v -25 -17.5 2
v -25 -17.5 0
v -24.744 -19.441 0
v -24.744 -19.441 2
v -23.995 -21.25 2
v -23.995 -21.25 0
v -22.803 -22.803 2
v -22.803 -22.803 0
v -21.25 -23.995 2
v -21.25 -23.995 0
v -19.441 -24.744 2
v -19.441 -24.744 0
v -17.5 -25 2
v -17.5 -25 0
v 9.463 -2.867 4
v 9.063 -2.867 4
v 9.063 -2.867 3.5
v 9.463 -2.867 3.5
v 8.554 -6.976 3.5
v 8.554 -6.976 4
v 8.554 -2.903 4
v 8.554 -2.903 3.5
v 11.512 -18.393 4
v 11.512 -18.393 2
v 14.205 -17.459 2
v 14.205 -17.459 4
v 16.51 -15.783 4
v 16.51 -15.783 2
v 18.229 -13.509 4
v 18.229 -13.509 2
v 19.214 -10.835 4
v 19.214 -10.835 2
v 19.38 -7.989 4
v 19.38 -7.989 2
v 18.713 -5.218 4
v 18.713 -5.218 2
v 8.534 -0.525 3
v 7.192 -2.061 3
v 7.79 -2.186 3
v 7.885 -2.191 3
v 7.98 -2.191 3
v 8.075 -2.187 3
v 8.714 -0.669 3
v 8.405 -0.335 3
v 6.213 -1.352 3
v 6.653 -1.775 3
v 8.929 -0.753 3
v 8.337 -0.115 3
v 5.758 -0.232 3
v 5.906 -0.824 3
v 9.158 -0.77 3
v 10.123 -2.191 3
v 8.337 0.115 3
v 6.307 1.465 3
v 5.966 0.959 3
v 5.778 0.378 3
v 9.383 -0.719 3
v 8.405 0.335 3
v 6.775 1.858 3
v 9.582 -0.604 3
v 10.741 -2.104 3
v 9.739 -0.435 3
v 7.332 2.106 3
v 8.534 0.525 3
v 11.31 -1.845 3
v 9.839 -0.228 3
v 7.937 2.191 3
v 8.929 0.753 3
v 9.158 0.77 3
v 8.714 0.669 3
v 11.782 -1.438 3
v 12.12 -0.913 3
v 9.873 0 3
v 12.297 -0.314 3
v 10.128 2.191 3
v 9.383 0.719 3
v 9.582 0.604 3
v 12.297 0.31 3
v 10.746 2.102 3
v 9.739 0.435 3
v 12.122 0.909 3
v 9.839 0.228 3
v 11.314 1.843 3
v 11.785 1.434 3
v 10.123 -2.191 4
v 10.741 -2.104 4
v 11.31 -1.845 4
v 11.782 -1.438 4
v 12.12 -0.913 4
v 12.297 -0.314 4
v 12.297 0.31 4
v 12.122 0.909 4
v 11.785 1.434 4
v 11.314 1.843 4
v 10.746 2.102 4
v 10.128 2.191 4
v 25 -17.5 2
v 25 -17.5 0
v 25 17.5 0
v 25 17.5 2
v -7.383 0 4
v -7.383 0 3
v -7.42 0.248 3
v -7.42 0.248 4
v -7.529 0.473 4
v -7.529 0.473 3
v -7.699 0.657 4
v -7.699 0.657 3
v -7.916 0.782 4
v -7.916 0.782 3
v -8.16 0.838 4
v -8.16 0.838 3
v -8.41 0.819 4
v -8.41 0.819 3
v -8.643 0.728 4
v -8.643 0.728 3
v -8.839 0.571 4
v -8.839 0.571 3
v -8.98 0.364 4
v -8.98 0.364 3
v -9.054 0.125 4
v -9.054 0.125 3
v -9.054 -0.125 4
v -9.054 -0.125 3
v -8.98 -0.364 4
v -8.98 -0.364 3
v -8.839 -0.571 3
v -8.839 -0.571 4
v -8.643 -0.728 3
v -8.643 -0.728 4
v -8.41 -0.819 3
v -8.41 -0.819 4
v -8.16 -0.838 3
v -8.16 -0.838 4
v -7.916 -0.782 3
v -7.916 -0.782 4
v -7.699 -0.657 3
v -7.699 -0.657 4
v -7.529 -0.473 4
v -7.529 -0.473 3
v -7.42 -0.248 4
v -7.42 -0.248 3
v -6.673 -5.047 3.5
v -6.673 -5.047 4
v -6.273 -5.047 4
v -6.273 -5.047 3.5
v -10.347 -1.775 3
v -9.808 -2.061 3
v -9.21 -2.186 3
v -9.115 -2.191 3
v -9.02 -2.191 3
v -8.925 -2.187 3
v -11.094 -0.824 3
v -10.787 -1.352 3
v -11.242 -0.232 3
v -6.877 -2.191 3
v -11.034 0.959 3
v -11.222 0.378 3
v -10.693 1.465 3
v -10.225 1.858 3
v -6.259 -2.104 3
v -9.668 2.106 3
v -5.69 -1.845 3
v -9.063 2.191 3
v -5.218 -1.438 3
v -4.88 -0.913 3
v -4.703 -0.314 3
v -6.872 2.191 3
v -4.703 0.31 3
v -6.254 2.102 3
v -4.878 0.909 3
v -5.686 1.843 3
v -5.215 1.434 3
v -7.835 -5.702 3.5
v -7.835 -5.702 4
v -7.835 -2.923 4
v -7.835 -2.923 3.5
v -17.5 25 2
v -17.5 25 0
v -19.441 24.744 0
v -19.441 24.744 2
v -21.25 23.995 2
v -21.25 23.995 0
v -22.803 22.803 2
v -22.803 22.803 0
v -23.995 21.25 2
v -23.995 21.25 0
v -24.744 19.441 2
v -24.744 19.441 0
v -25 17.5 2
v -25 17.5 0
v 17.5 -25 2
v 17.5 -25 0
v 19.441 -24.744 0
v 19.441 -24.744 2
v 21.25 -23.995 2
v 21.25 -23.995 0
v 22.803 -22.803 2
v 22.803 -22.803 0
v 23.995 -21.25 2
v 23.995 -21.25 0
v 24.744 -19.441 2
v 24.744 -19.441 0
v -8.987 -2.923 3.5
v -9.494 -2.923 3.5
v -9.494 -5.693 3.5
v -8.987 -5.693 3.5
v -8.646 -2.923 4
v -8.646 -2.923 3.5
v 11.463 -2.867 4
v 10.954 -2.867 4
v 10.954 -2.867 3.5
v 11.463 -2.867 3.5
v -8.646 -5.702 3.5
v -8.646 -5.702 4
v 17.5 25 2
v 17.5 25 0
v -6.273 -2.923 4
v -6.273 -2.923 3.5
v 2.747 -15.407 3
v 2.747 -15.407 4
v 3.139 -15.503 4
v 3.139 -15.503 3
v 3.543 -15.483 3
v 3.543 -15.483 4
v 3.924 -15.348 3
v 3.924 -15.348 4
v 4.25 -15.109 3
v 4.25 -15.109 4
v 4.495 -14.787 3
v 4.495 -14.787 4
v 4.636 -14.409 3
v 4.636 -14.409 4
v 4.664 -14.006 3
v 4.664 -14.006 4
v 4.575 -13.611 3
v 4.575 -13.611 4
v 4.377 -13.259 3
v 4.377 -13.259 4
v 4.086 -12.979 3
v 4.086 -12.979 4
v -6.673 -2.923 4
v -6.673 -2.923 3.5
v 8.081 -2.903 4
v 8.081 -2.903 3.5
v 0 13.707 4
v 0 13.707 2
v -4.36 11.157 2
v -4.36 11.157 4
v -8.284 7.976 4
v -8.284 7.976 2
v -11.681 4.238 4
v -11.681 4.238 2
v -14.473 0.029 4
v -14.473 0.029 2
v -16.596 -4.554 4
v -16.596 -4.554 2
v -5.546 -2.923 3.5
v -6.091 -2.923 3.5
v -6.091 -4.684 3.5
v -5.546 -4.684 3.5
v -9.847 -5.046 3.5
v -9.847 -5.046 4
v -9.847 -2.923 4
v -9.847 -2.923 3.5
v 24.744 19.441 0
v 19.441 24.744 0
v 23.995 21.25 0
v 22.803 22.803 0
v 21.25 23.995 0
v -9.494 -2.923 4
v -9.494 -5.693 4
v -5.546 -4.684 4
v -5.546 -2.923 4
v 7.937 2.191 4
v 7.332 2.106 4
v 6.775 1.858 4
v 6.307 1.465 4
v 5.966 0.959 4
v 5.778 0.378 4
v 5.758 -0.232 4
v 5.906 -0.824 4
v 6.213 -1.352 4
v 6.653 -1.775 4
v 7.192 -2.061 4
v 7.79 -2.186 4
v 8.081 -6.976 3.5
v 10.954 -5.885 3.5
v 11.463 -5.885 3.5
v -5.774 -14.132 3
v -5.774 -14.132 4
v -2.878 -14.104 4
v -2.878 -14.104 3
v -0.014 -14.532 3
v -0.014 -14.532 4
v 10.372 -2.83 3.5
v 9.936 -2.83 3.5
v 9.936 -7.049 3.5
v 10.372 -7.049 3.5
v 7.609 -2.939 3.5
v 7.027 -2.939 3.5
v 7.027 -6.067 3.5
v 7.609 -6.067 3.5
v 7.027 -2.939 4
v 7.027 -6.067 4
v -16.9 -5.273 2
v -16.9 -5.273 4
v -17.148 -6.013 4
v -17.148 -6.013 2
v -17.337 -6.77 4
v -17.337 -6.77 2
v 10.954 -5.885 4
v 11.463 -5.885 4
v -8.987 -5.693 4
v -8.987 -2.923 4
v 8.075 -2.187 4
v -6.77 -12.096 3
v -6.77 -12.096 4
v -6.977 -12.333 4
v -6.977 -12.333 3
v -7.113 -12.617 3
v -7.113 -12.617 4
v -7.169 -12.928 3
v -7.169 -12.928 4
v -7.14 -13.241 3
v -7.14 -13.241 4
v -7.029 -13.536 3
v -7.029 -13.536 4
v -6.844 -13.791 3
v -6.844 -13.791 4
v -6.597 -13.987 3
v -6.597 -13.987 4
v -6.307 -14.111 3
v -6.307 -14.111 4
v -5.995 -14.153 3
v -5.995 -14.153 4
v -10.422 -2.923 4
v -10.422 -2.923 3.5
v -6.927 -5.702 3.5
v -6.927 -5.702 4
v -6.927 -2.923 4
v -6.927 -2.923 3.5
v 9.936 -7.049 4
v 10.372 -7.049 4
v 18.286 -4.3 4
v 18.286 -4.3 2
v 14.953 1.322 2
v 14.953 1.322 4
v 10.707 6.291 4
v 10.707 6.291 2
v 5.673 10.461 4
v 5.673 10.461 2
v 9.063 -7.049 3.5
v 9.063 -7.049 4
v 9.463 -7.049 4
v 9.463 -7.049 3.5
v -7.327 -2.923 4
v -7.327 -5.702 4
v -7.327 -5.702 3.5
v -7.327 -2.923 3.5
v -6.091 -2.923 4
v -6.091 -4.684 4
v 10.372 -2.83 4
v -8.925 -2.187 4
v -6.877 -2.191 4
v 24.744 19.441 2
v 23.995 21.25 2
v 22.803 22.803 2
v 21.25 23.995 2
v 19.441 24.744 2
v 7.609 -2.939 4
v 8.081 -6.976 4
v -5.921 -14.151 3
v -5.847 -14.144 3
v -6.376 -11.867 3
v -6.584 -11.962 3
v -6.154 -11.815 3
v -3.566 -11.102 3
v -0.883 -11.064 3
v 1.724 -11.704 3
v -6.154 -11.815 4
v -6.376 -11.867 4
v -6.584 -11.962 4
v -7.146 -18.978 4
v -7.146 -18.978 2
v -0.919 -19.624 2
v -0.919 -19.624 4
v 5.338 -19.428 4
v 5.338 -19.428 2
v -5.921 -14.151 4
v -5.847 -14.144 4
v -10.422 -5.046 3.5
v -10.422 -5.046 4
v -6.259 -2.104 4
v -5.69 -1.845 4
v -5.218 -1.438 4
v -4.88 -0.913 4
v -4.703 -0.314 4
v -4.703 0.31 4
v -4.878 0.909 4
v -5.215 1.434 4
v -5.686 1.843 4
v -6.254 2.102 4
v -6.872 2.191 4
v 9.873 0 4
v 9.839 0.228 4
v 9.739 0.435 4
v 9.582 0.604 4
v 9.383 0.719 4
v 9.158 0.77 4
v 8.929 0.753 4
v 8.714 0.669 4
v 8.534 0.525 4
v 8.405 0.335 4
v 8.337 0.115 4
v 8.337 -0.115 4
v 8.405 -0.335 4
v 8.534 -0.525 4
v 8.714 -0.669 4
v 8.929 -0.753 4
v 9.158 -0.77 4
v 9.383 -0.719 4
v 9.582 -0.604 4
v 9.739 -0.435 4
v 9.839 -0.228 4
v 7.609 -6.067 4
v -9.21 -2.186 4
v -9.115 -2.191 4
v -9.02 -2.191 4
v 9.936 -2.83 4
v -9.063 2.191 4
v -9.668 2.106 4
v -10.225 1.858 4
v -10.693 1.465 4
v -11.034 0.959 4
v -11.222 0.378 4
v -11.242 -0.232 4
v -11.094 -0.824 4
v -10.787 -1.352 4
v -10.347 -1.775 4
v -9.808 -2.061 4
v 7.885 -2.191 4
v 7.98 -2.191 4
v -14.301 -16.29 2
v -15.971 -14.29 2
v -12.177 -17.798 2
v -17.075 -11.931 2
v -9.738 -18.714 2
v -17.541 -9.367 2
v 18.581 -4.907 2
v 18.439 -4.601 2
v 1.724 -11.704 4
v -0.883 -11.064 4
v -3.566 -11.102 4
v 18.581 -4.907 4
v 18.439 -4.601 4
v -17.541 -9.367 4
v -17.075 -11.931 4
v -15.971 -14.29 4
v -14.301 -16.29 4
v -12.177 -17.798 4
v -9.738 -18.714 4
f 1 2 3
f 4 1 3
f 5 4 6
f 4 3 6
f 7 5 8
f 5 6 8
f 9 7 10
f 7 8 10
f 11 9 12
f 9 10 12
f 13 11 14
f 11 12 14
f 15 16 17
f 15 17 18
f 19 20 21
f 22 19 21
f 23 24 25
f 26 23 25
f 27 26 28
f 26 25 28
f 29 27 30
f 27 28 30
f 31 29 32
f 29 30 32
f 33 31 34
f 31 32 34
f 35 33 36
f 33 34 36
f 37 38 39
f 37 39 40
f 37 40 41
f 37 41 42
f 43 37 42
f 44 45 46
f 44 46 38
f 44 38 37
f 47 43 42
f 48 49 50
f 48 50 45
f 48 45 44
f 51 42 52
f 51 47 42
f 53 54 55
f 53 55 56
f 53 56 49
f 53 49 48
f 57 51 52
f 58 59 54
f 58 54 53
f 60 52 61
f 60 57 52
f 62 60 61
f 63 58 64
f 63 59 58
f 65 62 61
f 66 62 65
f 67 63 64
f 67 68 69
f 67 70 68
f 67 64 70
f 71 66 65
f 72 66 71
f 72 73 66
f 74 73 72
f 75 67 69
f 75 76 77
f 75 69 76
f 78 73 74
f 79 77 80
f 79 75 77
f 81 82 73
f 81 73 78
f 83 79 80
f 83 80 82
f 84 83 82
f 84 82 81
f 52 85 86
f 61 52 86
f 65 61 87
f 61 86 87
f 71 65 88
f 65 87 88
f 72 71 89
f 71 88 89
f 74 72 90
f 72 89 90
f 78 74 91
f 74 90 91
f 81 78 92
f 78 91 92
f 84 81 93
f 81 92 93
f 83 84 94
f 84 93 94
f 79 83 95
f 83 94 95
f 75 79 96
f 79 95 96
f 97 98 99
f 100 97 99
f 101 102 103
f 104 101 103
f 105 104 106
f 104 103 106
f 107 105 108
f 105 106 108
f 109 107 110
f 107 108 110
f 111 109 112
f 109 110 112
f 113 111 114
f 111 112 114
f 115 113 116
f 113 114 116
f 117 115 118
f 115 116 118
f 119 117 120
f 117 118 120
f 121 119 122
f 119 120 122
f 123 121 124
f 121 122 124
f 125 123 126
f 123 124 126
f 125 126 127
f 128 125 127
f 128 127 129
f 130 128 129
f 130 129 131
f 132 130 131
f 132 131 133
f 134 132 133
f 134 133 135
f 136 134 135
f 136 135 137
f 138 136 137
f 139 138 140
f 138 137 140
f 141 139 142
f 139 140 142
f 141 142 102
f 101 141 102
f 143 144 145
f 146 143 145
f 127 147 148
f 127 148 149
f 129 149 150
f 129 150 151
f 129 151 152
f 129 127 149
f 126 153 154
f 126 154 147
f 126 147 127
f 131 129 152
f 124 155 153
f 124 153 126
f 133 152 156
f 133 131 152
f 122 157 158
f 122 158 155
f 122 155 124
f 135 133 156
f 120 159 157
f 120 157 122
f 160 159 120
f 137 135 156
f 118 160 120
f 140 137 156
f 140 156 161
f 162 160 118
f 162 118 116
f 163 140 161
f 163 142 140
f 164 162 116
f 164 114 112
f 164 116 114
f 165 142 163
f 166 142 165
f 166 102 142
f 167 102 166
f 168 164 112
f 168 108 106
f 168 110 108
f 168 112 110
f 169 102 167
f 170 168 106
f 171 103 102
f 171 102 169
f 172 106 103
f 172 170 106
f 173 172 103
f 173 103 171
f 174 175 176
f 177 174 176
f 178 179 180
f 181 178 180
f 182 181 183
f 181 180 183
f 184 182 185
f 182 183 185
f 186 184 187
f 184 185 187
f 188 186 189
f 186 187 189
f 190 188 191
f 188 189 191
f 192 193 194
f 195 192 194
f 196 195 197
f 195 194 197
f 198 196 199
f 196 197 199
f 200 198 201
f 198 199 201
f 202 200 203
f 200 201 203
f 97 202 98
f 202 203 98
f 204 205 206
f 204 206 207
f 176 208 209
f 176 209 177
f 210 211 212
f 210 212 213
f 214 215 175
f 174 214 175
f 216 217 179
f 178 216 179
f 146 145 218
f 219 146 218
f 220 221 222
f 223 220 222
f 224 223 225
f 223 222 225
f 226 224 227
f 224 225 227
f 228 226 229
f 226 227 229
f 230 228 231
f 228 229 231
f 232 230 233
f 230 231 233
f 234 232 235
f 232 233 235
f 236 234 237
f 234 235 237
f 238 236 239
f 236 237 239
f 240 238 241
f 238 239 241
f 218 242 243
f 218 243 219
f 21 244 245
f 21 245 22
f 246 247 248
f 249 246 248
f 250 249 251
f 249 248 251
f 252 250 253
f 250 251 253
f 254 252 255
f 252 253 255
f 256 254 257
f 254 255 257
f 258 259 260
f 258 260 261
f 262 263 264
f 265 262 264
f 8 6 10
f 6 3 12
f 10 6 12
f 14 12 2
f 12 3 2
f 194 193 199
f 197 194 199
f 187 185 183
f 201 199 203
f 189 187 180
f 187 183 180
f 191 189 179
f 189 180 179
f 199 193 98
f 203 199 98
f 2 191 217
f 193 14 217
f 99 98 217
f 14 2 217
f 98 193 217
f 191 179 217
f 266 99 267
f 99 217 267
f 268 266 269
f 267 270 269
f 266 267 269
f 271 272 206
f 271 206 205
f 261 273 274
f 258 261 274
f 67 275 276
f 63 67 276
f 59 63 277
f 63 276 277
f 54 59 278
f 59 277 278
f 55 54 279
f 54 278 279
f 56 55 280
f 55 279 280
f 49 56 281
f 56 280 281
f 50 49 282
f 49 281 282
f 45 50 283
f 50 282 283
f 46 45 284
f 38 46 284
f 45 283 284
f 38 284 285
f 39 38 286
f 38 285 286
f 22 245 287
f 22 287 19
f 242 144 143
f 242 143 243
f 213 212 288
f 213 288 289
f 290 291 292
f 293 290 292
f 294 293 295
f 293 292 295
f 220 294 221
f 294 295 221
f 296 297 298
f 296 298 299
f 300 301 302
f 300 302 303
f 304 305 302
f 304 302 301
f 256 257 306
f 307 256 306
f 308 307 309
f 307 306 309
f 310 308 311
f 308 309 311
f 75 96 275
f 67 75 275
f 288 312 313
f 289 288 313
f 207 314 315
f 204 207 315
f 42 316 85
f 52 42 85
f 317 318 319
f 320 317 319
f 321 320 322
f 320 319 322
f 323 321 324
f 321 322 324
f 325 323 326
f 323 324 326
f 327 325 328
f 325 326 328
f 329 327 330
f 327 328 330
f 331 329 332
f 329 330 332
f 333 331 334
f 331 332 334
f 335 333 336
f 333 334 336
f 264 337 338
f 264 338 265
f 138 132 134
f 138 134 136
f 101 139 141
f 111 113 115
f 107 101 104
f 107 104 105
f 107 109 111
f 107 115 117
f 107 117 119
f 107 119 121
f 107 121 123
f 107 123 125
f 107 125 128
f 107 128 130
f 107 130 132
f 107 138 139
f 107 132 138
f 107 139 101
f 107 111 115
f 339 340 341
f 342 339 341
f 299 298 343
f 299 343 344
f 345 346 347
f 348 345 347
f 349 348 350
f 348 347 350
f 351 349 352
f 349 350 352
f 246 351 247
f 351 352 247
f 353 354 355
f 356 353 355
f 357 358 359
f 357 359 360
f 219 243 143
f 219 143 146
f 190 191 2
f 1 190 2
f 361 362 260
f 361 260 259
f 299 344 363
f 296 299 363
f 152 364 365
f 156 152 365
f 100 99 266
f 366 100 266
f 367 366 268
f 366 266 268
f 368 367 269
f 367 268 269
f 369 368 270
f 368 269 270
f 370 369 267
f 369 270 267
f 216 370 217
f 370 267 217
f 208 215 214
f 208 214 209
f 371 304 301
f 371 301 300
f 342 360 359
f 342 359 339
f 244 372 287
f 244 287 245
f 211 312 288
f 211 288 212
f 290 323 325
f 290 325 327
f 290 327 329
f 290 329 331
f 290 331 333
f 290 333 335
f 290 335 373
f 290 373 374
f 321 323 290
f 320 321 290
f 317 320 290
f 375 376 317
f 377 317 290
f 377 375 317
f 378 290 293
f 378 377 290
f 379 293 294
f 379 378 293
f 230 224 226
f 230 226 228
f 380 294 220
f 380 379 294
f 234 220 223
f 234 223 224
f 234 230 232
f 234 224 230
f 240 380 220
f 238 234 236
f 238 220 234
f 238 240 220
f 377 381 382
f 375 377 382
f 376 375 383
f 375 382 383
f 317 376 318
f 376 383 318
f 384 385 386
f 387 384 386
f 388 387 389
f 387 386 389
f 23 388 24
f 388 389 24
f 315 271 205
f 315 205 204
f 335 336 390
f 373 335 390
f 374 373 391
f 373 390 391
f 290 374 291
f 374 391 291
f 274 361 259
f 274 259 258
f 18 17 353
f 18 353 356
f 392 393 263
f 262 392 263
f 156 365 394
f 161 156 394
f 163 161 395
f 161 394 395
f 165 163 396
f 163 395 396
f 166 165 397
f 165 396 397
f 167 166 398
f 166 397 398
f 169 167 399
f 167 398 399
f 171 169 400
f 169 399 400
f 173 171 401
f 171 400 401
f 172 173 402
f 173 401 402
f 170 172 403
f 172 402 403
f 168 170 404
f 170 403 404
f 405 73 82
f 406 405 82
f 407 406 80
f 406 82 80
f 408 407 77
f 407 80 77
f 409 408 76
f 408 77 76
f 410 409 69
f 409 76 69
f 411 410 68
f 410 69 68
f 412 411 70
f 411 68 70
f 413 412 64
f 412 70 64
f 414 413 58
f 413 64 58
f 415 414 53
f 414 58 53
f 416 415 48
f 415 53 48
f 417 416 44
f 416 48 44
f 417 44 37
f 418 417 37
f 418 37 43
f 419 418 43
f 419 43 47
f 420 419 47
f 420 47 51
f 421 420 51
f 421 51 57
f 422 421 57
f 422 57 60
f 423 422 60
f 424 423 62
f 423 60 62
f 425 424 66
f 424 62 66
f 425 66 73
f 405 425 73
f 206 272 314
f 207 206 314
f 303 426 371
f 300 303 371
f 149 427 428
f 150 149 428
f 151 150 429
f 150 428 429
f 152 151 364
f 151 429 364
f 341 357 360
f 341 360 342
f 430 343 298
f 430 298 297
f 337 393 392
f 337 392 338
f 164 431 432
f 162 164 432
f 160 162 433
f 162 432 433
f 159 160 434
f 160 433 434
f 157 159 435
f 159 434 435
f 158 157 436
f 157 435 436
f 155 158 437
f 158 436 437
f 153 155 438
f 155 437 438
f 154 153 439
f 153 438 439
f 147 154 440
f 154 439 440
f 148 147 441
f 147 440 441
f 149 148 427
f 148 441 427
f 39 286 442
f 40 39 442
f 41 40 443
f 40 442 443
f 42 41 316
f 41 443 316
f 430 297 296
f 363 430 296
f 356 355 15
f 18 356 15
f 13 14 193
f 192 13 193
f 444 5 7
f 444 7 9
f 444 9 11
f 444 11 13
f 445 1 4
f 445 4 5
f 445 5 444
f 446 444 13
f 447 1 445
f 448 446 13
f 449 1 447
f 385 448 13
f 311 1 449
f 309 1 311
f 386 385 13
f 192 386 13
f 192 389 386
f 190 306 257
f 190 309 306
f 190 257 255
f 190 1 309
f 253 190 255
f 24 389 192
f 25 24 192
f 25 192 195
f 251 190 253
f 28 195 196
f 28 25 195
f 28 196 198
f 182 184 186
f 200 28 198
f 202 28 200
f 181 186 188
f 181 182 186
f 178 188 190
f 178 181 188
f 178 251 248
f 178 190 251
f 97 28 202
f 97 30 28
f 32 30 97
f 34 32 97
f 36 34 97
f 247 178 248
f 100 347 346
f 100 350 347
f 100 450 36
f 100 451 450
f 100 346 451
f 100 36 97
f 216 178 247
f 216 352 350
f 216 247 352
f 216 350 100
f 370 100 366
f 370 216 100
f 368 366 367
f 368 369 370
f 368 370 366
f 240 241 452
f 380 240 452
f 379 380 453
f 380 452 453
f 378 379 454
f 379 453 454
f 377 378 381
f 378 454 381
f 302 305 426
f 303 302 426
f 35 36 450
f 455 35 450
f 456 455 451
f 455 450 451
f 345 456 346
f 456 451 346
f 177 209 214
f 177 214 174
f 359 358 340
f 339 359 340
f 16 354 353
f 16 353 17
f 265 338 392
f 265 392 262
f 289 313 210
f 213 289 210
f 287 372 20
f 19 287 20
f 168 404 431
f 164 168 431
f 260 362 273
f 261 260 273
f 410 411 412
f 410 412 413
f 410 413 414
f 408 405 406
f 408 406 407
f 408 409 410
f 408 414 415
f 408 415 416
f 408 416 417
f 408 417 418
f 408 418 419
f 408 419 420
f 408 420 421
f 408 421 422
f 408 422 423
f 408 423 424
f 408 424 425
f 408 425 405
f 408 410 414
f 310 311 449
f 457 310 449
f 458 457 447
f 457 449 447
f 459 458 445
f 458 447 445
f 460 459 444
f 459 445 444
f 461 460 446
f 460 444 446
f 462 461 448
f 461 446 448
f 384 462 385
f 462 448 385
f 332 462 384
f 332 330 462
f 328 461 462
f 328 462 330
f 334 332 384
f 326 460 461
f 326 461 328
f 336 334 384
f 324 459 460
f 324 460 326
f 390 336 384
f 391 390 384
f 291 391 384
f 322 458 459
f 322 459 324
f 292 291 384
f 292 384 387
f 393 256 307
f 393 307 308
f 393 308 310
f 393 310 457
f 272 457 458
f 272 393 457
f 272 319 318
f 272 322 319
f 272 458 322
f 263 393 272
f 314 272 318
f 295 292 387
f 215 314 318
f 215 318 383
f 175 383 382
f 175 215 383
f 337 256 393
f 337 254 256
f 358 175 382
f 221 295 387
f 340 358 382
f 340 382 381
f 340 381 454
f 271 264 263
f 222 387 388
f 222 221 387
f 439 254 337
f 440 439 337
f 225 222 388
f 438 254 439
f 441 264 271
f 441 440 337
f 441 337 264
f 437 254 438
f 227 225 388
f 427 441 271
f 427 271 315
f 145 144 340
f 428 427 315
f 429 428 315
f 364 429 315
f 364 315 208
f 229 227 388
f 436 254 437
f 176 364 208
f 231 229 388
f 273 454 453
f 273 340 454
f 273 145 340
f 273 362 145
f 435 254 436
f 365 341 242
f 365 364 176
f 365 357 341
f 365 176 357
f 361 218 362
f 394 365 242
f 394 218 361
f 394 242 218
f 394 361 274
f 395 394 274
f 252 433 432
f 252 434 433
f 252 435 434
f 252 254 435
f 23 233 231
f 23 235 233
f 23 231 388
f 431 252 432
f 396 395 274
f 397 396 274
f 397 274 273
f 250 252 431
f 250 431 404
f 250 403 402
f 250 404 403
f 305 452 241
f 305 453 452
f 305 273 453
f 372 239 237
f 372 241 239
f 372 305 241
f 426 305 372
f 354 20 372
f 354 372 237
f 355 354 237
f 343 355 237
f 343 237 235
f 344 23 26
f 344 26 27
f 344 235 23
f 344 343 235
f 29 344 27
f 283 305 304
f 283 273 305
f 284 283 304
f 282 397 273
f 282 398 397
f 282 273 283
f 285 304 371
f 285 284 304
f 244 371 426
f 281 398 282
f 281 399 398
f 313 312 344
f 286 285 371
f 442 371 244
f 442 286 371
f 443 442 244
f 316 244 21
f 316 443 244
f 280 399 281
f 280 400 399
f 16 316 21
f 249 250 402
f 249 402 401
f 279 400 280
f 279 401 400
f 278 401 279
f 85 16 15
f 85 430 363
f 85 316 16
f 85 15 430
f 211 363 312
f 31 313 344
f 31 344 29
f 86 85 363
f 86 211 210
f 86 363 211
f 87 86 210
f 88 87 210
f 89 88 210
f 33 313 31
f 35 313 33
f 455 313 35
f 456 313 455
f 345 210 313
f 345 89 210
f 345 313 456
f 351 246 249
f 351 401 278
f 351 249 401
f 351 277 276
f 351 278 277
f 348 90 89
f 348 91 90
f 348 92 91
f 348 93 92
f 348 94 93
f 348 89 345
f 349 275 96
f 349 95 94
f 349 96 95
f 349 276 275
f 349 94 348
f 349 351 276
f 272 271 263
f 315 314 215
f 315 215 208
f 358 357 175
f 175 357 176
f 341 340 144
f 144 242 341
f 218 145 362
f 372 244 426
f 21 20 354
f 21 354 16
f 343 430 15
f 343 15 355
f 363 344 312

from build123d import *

# Parameters (mm, degrees)
F1_DEPTH  = 2
F3_DEPTH  = 2
F5_DEPTH  = 1
F6_R      = 0.84006
F7_DEPTH  = 1
F8_R      = 0.772284
F9_DEPTH  = 1
F10_W     = 0.575737
F10_H     = 2.122555
F10_W_2   = 0.4
F10_H_2   = 2.778417
F10_H_3   = 2.12387
F10_W_3   = 0.545456
F10_H_4   = 1.760233
F10_W_4   = 0.581819
F10_H_5   = 3.127278
F10_W_5   = 0.472728
F10_H_6   = 4.072734
F10_W_6   = 0.400001
F10_H_7   = 4.181825
F10_W_7   = 0.436365
F10_H_8   = 4.218189
F10_W_8   = 0.509092
F10_H_9   = 3.018187
F10_W_9   = 0.507496
F10_H_10  = 2.769646
F10_W_10  = 0.811112
F11_DEPTH = 0.5


with BuildPart() as f1:
    # F0 (on Top) → F1 (new body)
    with BuildSketch(Plane.XY):
        with BuildLine():
            Line((17.5, 25), (-17.5, 25))
            ThreePointArc((-17.5, 25), (-22.803301, 22.803301), (-25, 17.5))
            Line((-25, 17.5), (-25, -17.5))
            ThreePointArc((-25, -17.5), (-22.803301, -22.803301), (-17.5, -25))
            Line((-17.5, -25), (17.5, -25))
            ThreePointArc((17.5, -25), (22.803301, -22.803301), (25, -17.5))
            Line((25, -17.5), (25, 17.5))
            ThreePointArc((25, 17.5), (22.803301, 22.803301), (17.5, 25))
        make_face()
    extrude(amount=F1_DEPTH)

    # F2 (on face) → F3 (join)
    with BuildSketch(Plane.XY.offset(2)):
        with BuildLine():
            ThreePointArc((-17.337266, -6.77024), (-16.986234, -5.655714), (-16.596286, -4.5542))
            ThreePointArc((-16.596286, -4.5542), (-17.030893, -5.640781), (-17.337266, -6.77024))
        make_face()
        with BuildLine():
            ThreePointArc((0, 13.707489), (-10.053503, 6.171922), (-16.596286, -4.5542))
            ThreePointArc((-16.596286, -4.5542), (-16.986234, -5.655714), (-17.337266, -6.77024))
            ThreePointArc((-17.337266, -6.77024), (-15.200345, -15.343852), (-7.146251, -18.977696))
            ThreePointArc((-7.146251, -18.977696), (2.212472, -19.631089), (11.51198, -18.393445))
            ThreePointArc((11.51198, -18.393445), (18.229392, -13.509449), (18.713062, -5.218303))
            ThreePointArc((18.713062, -5.218303), (18.502407, -4.757976), (18.285647, -4.300492))
            ThreePointArc((18.285647, -4.300492), (10.706603, 6.29139), (0, 13.707489))
        make_face()
        with BuildLine():
            ThreePointArc((18.713062, -5.218303), (18.511326, -4.753823), (18.285647, -4.300492))
            ThreePointArc((18.285647, -4.300492), (18.502407, -4.757976), (18.713062, -5.218303))
        make_face()
    extrude(amount=F3_DEPTH)

    # F4 (on face) → F5 (cut)
    with BuildSketch(Plane.XY.offset(4)):
        with BuildLine():
            Line((-6.871892, 2.191255), (-9.063148, 2.191255))
            ThreePointArc((-9.063148, 2.191255), (-11.253164, 0.073695), (-9.210455, -2.186298))
            Line((-9.210455, -2.186298), (-8.925119, -2.186904))
            Line((-8.925119, -2.186904), (-6.876542, -2.191251))
            ThreePointArc((-6.876542, -2.191251), (-4.680638, -0.002325), (-6.871892, 2.191255))
        make_face()
        with BuildLine():
            Line((-8.925119, -2.186904), (-9.210455, -2.186298))
            ThreePointArc((-9.210455, -2.186298), (-9.067797, -2.191251), (-8.925119, -2.186904))
        make_face()
        with BuildLine():
            Line((10.128108, 2.191255), (7.936852, 2.191255))
            ThreePointArc((7.936852, 2.191255), (5.746836, 0.073695), (7.789545, -2.186298))
            Line((7.789545, -2.186298), (8.074881, -2.186904))
            Line((8.074881, -2.186904), (10.123458, -2.191251))
            ThreePointArc((10.123458, -2.191251), (12.319362, -0.002325), (10.128108, 2.191255))
        make_face()
        with BuildLine():
            Line((8.074881, -2.186904), (7.789545, -2.186298))
            ThreePointArc((7.789545, -2.186298), (7.932203, -2.191251), (8.074881, -2.186904))
        make_face()
        with BuildLine():
            ThreePointArc((-6.770146, -12.095645), (-6.464266, -11.95017), (-6.153883, -11.814569))
            ThreePointArc((-6.153883, -11.814569), (-6.482713, -11.909726), (-6.770146, -12.095645))
        make_face()
        with BuildLine():
            ThreePointArc((4.085766, -12.978509), (-0.882645, -11.0645), (-6.153883, -11.814569))
            ThreePointArc((-6.153883, -11.814569), (-6.464266, -11.95017), (-6.770146, -12.095645))
            ThreePointArc((-6.770146, -12.095645), (-7.094568, -13.392527), (-5.995244, -14.153211))
            ThreePointArc((-5.995244, -14.153211), (-5.884481, -14.14233), (-5.773655, -14.132122))
            ThreePointArc((-5.773655, -14.132122), (-1.437532, -14.261511), (2.746676, -15.40655))
            ThreePointArc((2.746676, -15.40655), (4.494557, -14.787244), (4.085766, -12.978509))
        make_face()
        with BuildLine():
            ThreePointArc((-5.773655, -14.132122), (-5.884481, -14.14233), (-5.995244, -14.153211))
            ThreePointArc((-5.995244, -14.153211), (-5.883949, -14.147927), (-5.773655, -14.132122))
        make_face()
    extrude(amount=-F5_DEPTH, mode=Mode.SUBTRACT)

    # F6 (on face) → F7 (join)
    with BuildSketch(Plane.XY.offset(3)):
        with Locations((-8.223088, 0)):
            Circle(F6_R)
    extrude(amount=F7_DEPTH)

    # F8 (on face) → F9 (join)
    with BuildSketch(Plane.XY.offset(3)):
        with Locations((9.100624, 0)):
            Circle(F8_R)
    extrude(amount=F9_DEPTH)

    # F10 (on face) → F11 (cut)
    with BuildSketch(Plane.XY.offset(4)):
        with Locations((-10.134581, -3.984638)):
            Rectangle(F10_W, F10_H)
        with Locations((-7.127401, -4.31257)):
            Rectangle(F10_W_2, F10_H_2)
        with Locations((-6.472855, -3.985296)):
            Rectangle(F10_W_2, F10_H_3)
        with Locations((-5.818308, -3.803477)):
            Rectangle(F10_W_3, F10_H_4)
        with Locations((7.317732, -4.503073)):
            Rectangle(F10_W_4, F10_H_5)
        with Locations((8.317734, -4.939437)):
            Rectangle(F10_W_5, F10_H_6)
        with Locations((9.263191, -4.957618)):
            Rectangle(F10_W_6, F10_H_7)
        with Locations((10.154101, -4.939436)):
            Rectangle(F10_W_7, F10_H_8)
        with Locations((11.208649, -4.375799)):
            Rectangle(F10_W_8, F10_H_9)
        with Locations((-9.240523, -4.308184)):
            Rectangle(F10_W_9, F10_H_10)
        with Locations((-8.240381, -4.31257)):
            Rectangle(F10_W_10, F10_H_2)
    extrude(amount=-F11_DEPTH, mode=Mode.SUBTRACT)


solid = f1.part
